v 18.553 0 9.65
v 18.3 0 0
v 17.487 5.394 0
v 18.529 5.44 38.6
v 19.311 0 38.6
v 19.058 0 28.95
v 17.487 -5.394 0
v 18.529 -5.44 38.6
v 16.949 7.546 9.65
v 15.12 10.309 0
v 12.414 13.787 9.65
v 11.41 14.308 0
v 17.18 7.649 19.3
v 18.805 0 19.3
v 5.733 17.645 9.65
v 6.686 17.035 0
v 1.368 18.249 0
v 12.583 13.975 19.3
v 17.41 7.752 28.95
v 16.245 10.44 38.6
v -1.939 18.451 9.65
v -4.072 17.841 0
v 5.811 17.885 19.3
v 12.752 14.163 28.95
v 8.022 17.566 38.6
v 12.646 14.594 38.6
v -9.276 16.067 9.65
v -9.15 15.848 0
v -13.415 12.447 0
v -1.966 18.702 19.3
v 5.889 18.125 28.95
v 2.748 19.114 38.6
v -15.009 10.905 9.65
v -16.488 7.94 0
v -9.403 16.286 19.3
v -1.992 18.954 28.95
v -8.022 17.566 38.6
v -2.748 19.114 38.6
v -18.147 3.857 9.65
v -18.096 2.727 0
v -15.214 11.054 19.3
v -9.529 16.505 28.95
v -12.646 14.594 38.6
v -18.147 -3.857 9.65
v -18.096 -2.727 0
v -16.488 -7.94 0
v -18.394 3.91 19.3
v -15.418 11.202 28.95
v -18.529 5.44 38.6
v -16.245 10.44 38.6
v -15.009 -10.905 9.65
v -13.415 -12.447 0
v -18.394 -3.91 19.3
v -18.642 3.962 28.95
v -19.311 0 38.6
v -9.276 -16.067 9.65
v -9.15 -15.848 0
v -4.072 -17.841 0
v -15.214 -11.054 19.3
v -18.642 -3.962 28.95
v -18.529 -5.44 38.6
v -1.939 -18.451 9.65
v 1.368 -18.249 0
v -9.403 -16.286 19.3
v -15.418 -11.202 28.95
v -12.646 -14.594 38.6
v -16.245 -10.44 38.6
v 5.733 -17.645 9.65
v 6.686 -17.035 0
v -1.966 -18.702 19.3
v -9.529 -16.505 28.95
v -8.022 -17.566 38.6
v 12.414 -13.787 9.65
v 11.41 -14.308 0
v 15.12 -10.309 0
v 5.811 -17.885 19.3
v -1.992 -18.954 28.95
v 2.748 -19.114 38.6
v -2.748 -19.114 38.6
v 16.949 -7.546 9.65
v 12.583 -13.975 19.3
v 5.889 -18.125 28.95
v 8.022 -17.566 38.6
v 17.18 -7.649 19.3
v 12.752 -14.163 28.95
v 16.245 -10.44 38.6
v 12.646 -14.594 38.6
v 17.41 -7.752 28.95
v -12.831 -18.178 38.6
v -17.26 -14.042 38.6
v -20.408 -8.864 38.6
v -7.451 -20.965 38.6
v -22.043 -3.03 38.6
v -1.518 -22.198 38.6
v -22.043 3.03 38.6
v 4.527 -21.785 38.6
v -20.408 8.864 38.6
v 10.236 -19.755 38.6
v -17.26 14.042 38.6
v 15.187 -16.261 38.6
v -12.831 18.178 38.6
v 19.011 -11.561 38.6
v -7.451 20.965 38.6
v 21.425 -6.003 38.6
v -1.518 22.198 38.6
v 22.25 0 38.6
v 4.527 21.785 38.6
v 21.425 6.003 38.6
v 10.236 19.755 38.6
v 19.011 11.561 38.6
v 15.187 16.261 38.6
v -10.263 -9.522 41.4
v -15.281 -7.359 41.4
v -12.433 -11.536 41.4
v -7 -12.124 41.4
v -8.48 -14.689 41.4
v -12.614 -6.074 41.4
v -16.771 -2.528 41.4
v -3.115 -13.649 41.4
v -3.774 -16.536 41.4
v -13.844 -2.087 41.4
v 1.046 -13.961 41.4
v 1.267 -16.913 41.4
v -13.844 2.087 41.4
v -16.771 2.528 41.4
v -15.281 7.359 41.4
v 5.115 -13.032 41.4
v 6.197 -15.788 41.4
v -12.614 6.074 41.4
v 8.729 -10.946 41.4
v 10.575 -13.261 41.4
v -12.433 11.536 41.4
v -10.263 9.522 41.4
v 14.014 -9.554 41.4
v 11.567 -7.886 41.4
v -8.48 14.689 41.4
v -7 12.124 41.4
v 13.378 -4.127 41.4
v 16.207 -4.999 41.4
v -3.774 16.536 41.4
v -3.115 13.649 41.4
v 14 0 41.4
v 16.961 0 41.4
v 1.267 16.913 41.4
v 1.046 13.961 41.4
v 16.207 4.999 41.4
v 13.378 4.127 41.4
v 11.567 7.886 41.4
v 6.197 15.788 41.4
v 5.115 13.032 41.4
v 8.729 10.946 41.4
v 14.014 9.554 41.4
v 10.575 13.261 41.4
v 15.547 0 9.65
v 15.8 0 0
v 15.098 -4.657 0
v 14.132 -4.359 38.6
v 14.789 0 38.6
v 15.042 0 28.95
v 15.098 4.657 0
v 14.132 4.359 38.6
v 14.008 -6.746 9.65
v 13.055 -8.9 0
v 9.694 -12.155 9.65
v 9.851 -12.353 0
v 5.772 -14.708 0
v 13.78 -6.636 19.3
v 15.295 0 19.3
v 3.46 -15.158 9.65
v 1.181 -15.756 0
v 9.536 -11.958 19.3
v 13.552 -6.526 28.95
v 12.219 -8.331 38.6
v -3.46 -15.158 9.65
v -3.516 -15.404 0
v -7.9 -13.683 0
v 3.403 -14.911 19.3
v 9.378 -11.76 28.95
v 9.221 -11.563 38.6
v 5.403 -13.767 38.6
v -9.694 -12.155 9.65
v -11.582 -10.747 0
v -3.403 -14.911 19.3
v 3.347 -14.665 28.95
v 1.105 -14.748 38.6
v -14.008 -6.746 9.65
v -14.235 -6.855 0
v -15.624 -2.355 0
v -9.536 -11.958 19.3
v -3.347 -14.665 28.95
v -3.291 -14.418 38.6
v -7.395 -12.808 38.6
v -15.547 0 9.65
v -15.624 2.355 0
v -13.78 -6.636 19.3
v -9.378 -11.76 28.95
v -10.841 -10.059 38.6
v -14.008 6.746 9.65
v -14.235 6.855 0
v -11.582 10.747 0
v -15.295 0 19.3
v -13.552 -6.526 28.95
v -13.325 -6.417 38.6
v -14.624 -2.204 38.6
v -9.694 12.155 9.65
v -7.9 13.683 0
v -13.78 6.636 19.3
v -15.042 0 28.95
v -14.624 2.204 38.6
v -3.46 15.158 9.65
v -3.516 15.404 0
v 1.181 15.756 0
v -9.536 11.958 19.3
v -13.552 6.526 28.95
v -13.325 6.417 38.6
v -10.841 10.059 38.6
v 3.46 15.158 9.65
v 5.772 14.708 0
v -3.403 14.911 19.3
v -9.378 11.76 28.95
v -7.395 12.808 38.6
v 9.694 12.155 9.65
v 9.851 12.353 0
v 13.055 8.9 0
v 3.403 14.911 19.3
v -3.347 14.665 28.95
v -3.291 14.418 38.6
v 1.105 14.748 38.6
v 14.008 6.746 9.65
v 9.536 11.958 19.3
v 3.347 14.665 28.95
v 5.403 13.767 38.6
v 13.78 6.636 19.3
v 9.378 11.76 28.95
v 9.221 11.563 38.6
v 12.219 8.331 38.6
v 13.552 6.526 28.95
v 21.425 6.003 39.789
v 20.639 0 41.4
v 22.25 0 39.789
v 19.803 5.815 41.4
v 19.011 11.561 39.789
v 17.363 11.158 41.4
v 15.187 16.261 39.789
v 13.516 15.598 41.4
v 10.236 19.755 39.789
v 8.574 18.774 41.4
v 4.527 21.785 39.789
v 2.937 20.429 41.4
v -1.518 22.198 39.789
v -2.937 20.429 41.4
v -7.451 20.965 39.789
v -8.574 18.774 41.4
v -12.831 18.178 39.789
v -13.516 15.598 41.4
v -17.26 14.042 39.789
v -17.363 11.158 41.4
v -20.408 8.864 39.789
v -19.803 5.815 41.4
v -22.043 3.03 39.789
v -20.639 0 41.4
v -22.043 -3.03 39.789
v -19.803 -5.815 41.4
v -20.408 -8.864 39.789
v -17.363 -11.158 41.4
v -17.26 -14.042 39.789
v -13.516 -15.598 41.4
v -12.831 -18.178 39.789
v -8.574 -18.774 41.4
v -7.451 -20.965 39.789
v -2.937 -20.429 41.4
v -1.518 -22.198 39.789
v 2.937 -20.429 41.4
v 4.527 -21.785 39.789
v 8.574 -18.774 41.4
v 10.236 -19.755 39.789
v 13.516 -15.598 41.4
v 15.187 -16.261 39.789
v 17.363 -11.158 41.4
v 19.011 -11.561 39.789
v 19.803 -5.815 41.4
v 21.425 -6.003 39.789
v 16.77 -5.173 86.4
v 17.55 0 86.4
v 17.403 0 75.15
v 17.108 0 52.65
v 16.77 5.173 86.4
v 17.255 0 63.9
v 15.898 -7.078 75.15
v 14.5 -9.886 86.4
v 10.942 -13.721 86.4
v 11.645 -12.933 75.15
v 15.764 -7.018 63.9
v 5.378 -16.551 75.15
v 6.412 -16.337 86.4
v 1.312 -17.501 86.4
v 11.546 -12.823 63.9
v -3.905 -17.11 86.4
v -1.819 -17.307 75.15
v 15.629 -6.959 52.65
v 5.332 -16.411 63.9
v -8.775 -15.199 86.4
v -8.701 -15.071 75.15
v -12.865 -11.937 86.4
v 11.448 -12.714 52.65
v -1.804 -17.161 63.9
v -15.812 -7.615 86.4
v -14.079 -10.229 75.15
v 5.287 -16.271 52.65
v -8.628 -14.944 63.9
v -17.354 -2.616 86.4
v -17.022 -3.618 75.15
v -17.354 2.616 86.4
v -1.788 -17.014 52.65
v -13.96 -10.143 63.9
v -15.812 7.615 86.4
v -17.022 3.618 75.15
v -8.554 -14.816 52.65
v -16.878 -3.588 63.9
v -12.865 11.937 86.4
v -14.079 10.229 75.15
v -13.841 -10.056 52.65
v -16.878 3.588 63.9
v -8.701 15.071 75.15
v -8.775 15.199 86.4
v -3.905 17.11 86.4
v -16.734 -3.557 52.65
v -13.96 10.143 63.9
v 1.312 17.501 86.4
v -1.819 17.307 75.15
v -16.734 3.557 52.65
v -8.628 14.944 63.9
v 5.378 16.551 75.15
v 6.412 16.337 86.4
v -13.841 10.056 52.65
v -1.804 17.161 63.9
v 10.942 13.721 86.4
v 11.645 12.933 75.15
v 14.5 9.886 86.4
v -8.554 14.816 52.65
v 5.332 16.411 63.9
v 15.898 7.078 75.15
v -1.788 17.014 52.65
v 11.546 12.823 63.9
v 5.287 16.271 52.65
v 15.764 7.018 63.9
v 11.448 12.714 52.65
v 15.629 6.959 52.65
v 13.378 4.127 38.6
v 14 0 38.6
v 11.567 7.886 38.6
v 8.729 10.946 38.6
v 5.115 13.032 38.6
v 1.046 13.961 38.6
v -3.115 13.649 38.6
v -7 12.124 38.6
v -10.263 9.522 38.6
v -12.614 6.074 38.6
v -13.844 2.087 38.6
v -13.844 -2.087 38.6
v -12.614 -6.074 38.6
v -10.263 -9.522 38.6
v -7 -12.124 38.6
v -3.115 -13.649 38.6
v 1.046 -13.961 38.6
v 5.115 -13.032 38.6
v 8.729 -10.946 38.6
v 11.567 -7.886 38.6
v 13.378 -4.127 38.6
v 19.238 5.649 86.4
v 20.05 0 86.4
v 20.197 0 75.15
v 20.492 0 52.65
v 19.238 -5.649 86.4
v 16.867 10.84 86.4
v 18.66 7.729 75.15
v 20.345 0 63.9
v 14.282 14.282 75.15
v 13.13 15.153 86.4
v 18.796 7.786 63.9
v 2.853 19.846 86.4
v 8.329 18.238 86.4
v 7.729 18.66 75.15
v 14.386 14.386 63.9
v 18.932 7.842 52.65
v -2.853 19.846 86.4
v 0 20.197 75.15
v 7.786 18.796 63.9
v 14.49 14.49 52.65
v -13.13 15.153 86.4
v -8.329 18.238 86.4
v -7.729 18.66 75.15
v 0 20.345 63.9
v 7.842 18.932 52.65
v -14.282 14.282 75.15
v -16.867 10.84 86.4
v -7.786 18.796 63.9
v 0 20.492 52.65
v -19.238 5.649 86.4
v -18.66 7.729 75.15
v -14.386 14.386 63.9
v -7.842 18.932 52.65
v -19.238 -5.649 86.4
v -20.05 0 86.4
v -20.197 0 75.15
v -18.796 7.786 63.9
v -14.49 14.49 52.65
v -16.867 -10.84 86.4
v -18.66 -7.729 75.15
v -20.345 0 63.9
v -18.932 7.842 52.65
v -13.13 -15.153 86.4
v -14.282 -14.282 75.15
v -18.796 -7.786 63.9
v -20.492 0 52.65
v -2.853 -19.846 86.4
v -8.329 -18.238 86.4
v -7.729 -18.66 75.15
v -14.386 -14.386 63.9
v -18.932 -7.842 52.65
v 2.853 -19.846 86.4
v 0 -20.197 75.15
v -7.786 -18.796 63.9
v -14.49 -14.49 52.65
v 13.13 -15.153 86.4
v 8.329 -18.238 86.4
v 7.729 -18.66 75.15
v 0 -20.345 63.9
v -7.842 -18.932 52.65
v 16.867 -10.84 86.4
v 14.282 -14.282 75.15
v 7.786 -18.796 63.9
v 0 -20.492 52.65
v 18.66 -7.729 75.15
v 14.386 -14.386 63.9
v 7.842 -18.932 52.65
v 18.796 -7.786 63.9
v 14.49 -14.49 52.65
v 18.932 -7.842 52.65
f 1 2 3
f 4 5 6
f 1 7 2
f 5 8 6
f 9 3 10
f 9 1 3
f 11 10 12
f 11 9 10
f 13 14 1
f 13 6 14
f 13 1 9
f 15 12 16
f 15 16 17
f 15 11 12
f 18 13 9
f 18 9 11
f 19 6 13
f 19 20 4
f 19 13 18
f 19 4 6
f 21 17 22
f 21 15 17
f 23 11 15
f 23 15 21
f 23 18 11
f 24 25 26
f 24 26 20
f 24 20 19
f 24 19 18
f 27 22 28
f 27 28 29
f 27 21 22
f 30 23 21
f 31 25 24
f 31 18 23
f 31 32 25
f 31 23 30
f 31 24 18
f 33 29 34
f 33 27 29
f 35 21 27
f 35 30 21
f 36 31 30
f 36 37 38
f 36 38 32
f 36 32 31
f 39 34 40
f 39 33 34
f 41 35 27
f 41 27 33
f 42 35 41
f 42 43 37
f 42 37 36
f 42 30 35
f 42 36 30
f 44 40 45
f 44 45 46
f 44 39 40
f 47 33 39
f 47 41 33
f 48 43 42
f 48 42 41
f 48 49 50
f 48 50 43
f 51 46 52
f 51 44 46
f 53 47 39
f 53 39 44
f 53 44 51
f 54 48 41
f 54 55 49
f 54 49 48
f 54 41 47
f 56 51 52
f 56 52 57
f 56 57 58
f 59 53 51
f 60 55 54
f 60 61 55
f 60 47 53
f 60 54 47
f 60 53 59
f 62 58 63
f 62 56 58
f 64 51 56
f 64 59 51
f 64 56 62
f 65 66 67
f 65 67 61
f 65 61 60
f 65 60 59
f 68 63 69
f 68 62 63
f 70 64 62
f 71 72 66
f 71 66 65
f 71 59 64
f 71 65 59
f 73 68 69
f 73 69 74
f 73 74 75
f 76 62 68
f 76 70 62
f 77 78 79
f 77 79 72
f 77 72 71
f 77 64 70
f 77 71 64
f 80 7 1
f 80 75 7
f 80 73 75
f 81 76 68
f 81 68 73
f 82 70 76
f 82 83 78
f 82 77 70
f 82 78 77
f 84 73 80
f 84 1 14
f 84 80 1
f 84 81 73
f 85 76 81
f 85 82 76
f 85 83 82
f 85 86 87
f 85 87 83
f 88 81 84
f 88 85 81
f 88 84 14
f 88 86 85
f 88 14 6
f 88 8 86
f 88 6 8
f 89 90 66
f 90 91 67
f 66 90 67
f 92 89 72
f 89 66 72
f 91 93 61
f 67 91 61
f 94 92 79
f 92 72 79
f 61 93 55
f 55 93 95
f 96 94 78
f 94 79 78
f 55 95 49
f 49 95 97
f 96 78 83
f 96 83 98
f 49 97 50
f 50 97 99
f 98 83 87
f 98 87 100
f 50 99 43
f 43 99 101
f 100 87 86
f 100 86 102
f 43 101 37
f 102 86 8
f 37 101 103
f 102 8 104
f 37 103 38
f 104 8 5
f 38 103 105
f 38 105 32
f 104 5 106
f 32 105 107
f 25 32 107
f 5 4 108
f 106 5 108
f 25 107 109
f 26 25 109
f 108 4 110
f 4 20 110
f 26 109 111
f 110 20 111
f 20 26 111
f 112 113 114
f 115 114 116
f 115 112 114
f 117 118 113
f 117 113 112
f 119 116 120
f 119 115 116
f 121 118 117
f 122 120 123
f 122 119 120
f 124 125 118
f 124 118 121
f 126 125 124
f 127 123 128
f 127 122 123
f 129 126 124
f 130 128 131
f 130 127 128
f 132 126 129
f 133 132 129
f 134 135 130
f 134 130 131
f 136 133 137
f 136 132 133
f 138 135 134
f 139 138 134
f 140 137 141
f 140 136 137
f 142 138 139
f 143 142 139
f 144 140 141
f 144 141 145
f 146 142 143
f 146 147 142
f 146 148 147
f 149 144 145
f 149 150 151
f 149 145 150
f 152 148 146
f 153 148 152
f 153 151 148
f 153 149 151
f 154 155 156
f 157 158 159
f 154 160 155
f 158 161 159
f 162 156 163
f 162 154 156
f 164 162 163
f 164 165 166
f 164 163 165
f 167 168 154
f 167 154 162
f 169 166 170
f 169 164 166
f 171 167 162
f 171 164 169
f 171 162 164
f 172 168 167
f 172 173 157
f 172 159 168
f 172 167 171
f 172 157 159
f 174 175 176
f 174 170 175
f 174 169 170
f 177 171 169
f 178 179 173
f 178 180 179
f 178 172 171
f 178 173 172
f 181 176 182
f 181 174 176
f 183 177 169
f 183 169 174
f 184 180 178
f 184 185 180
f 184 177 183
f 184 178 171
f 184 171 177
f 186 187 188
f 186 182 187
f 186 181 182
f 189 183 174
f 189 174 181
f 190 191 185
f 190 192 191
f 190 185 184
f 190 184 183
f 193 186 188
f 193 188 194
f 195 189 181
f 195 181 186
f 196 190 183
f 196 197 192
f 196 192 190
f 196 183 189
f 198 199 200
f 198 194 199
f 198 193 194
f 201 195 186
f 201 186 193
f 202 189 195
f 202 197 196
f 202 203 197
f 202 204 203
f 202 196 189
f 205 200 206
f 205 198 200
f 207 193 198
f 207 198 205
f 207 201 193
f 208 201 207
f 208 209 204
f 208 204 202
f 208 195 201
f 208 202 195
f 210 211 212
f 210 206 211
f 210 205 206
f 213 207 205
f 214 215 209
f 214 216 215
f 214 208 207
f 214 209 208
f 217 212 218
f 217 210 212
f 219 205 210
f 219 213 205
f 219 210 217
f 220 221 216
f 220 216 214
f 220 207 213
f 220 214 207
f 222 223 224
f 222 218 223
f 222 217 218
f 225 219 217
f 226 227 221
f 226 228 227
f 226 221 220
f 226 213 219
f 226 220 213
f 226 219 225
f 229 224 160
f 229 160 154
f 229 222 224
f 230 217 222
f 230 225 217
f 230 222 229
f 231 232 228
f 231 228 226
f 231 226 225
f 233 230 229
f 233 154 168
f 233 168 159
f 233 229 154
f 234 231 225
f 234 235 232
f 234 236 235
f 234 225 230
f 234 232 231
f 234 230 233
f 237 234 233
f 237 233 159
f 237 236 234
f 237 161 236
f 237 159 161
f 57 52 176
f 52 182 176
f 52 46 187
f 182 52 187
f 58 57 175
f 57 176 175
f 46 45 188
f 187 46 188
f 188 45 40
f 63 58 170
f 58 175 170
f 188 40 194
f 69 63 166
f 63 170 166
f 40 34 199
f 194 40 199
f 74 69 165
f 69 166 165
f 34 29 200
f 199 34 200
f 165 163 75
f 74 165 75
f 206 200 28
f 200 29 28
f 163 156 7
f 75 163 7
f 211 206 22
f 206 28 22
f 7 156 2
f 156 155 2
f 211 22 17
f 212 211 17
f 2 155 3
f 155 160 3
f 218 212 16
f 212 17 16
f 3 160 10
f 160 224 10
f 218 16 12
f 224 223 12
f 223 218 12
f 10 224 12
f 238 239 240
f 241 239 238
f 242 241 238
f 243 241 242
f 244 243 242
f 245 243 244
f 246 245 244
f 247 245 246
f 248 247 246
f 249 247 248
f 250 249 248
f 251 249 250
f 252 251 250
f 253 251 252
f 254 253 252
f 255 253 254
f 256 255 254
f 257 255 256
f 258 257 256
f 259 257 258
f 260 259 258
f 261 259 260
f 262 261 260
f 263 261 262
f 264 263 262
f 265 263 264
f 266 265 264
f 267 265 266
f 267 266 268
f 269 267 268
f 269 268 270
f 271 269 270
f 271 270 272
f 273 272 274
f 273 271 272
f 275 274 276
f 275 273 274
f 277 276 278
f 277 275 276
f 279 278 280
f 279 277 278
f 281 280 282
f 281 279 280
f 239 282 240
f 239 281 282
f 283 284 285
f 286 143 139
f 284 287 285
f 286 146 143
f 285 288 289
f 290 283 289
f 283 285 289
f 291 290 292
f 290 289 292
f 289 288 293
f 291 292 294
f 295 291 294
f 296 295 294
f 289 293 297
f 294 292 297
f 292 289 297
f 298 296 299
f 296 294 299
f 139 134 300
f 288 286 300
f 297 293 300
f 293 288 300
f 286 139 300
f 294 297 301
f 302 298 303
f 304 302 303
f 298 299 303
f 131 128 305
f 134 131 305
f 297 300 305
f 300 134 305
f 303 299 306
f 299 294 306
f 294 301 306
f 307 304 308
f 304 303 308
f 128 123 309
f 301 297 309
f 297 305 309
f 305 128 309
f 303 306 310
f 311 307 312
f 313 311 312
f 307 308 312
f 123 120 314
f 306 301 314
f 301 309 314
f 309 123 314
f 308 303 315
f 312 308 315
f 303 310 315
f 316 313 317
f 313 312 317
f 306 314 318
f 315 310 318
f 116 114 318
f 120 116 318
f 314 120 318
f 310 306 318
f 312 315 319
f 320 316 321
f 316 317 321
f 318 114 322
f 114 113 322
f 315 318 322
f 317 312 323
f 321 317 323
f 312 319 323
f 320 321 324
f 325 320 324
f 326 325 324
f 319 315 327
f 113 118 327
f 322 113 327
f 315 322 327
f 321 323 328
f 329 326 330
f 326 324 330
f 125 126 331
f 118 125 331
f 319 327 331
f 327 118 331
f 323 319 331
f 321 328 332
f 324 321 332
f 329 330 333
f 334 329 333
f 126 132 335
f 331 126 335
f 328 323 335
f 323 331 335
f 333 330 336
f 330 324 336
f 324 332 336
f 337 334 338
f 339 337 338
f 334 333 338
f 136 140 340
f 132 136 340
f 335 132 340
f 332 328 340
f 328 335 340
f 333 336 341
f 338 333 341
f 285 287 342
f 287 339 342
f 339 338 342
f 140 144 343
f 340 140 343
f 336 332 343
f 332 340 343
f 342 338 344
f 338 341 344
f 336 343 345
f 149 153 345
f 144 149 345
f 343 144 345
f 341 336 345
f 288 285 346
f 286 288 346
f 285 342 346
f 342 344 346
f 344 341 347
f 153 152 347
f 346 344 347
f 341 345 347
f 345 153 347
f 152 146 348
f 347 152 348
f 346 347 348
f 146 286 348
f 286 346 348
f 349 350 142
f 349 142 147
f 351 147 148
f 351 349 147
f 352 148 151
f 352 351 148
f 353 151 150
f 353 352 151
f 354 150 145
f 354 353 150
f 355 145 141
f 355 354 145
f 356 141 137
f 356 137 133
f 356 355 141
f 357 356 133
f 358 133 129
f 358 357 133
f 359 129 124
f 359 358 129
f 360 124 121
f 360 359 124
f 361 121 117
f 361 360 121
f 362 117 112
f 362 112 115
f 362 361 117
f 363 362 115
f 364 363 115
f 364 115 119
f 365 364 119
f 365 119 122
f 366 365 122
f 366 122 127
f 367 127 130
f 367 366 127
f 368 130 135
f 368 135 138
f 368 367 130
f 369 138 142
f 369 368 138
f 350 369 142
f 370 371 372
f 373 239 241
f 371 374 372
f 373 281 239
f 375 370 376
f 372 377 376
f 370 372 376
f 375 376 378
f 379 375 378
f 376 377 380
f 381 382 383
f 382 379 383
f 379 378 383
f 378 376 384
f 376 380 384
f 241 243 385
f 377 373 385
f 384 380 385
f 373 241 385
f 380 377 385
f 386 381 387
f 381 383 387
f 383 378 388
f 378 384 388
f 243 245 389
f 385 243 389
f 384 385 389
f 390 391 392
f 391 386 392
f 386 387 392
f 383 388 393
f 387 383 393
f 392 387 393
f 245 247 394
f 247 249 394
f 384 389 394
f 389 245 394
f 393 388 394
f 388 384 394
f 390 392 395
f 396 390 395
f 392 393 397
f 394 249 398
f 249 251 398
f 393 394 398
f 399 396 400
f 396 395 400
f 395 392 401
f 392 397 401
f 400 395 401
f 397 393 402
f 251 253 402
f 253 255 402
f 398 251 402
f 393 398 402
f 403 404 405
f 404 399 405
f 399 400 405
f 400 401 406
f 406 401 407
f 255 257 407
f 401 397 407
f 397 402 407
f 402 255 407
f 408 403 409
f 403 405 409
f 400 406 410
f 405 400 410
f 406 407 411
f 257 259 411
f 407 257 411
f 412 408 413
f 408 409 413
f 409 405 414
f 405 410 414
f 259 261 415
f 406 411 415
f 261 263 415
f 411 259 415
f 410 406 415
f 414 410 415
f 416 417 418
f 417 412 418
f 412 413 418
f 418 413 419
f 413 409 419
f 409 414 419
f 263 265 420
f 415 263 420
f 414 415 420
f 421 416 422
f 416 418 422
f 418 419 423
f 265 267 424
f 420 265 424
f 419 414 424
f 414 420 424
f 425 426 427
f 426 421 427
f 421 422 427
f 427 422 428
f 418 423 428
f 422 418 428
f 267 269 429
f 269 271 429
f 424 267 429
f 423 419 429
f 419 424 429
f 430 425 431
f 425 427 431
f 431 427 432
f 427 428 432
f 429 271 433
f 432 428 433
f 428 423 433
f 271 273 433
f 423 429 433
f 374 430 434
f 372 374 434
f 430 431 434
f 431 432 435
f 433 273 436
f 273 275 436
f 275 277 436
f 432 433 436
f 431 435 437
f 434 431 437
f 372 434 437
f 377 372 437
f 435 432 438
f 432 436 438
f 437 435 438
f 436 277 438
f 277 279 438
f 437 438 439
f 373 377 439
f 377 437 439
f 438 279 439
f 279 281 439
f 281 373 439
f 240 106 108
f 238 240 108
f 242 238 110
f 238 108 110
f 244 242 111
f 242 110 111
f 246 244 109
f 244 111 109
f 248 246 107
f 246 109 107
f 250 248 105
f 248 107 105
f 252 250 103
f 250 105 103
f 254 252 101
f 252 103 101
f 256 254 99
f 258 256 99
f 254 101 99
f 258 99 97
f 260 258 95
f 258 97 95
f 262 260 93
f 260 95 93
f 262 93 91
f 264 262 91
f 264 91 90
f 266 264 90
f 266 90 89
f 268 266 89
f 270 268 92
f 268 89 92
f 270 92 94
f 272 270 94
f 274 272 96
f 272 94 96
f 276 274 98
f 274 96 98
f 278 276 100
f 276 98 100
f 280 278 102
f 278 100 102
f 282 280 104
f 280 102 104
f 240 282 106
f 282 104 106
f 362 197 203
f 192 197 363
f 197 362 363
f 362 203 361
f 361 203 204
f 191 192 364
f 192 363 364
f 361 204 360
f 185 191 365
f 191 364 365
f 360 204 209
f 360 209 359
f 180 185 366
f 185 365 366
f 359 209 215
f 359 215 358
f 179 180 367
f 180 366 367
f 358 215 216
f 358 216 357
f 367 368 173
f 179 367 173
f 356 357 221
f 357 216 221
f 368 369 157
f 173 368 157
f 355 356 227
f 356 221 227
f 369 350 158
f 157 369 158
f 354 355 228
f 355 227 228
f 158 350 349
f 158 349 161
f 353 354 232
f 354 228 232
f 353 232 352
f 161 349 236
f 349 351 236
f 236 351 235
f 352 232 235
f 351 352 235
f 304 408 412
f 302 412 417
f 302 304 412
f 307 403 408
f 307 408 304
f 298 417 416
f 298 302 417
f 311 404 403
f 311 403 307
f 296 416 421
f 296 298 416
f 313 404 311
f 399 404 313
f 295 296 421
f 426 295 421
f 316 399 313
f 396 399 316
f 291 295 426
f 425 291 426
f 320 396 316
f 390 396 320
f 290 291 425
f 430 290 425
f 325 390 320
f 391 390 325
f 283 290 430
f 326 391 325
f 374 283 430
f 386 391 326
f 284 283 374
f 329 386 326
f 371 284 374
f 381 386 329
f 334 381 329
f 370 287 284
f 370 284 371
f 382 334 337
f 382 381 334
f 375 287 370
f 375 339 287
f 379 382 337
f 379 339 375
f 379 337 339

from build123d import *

# Parameters (mm, degrees)
F0_R      = 17.5
F0_R_2    = 15
F1_DEPTH  = 38.6
F1_TAPER  = -1.5
F2_R      = 22.25
F2_R_2    = 18.5107765726
F2_R_3    = 14
F3_DEPTH  = 2.8
F5_R      = 20.05
F5_R_2    = 17.55
F6_DEPTH  = 45
F6_TAPER  = -0.75
F7_SIZE   = 1.6109
F8_R      = 31.610490496
F9_DEPTH  = 38.6
F10_R     = 18.3
F10_R_2   = 15.8
F11_DEPTH = 38.6
F11_TAPER = -1.5


# Not quite as in the source:
# - a fillet or chamfer is up to 0.001 mm smaller than in the source, because OpenCascade refuses the exact size


with BuildPart() as f1:
    # F0 (on Top) → F1 (new body)
    with BuildSketch(Plane.XY):
        Circle(F0_R)
        Circle(F0_R_2, mode=Mode.SUBTRACT)
    extrude(amount=F1_DEPTH, taper=F1_TAPER)

    # F2 (on face) → F3 (join)
    with BuildSketch(Plane.XY.offset(38.6)):
        Circle(F2_R)
        Circle(F2_R_2, mode=Mode.SUBTRACT)
        Circle(F2_R_2)
        Circle(F2_R_3, mode=Mode.SUBTRACT)
    extrude(amount=F3_DEPTH)

    # F5 (on offset) → F6 (join, through all)
    with BuildSketch(Plane.XY.offset(86.4)):
        Circle(F5_R)
        Circle(F5_R_2, mode=Mode.SUBTRACT)
    extrude(amount=-F6_DEPTH, taper=F6_TAPER)

    # F7 (size 1.611 in the source; OpenCascade refuses exactly that, so slightly less here)
    f7_edges = [f1.edges().sort_by_distance(p)[0] for p in [
        (-22.25, 0, 41.4),
    ]]
    chamfer(f7_edges, length=F7_SIZE)

    # F8 (on Top) → F9 (cut, through all)
    with BuildSketch(Plane.XY):
        Circle(F8_R)
    extrude(amount=F9_DEPTH, mode=Mode.SUBTRACT)

    # F10 (on Top) → F11 (join, through all)
    with BuildSketch(Plane.XY):
        Circle(F10_R)
        Circle(F10_R_2, mode=Mode.SUBTRACT)
    extrude(amount=F11_DEPTH, taper=F11_TAPER)


solid = f1.part
